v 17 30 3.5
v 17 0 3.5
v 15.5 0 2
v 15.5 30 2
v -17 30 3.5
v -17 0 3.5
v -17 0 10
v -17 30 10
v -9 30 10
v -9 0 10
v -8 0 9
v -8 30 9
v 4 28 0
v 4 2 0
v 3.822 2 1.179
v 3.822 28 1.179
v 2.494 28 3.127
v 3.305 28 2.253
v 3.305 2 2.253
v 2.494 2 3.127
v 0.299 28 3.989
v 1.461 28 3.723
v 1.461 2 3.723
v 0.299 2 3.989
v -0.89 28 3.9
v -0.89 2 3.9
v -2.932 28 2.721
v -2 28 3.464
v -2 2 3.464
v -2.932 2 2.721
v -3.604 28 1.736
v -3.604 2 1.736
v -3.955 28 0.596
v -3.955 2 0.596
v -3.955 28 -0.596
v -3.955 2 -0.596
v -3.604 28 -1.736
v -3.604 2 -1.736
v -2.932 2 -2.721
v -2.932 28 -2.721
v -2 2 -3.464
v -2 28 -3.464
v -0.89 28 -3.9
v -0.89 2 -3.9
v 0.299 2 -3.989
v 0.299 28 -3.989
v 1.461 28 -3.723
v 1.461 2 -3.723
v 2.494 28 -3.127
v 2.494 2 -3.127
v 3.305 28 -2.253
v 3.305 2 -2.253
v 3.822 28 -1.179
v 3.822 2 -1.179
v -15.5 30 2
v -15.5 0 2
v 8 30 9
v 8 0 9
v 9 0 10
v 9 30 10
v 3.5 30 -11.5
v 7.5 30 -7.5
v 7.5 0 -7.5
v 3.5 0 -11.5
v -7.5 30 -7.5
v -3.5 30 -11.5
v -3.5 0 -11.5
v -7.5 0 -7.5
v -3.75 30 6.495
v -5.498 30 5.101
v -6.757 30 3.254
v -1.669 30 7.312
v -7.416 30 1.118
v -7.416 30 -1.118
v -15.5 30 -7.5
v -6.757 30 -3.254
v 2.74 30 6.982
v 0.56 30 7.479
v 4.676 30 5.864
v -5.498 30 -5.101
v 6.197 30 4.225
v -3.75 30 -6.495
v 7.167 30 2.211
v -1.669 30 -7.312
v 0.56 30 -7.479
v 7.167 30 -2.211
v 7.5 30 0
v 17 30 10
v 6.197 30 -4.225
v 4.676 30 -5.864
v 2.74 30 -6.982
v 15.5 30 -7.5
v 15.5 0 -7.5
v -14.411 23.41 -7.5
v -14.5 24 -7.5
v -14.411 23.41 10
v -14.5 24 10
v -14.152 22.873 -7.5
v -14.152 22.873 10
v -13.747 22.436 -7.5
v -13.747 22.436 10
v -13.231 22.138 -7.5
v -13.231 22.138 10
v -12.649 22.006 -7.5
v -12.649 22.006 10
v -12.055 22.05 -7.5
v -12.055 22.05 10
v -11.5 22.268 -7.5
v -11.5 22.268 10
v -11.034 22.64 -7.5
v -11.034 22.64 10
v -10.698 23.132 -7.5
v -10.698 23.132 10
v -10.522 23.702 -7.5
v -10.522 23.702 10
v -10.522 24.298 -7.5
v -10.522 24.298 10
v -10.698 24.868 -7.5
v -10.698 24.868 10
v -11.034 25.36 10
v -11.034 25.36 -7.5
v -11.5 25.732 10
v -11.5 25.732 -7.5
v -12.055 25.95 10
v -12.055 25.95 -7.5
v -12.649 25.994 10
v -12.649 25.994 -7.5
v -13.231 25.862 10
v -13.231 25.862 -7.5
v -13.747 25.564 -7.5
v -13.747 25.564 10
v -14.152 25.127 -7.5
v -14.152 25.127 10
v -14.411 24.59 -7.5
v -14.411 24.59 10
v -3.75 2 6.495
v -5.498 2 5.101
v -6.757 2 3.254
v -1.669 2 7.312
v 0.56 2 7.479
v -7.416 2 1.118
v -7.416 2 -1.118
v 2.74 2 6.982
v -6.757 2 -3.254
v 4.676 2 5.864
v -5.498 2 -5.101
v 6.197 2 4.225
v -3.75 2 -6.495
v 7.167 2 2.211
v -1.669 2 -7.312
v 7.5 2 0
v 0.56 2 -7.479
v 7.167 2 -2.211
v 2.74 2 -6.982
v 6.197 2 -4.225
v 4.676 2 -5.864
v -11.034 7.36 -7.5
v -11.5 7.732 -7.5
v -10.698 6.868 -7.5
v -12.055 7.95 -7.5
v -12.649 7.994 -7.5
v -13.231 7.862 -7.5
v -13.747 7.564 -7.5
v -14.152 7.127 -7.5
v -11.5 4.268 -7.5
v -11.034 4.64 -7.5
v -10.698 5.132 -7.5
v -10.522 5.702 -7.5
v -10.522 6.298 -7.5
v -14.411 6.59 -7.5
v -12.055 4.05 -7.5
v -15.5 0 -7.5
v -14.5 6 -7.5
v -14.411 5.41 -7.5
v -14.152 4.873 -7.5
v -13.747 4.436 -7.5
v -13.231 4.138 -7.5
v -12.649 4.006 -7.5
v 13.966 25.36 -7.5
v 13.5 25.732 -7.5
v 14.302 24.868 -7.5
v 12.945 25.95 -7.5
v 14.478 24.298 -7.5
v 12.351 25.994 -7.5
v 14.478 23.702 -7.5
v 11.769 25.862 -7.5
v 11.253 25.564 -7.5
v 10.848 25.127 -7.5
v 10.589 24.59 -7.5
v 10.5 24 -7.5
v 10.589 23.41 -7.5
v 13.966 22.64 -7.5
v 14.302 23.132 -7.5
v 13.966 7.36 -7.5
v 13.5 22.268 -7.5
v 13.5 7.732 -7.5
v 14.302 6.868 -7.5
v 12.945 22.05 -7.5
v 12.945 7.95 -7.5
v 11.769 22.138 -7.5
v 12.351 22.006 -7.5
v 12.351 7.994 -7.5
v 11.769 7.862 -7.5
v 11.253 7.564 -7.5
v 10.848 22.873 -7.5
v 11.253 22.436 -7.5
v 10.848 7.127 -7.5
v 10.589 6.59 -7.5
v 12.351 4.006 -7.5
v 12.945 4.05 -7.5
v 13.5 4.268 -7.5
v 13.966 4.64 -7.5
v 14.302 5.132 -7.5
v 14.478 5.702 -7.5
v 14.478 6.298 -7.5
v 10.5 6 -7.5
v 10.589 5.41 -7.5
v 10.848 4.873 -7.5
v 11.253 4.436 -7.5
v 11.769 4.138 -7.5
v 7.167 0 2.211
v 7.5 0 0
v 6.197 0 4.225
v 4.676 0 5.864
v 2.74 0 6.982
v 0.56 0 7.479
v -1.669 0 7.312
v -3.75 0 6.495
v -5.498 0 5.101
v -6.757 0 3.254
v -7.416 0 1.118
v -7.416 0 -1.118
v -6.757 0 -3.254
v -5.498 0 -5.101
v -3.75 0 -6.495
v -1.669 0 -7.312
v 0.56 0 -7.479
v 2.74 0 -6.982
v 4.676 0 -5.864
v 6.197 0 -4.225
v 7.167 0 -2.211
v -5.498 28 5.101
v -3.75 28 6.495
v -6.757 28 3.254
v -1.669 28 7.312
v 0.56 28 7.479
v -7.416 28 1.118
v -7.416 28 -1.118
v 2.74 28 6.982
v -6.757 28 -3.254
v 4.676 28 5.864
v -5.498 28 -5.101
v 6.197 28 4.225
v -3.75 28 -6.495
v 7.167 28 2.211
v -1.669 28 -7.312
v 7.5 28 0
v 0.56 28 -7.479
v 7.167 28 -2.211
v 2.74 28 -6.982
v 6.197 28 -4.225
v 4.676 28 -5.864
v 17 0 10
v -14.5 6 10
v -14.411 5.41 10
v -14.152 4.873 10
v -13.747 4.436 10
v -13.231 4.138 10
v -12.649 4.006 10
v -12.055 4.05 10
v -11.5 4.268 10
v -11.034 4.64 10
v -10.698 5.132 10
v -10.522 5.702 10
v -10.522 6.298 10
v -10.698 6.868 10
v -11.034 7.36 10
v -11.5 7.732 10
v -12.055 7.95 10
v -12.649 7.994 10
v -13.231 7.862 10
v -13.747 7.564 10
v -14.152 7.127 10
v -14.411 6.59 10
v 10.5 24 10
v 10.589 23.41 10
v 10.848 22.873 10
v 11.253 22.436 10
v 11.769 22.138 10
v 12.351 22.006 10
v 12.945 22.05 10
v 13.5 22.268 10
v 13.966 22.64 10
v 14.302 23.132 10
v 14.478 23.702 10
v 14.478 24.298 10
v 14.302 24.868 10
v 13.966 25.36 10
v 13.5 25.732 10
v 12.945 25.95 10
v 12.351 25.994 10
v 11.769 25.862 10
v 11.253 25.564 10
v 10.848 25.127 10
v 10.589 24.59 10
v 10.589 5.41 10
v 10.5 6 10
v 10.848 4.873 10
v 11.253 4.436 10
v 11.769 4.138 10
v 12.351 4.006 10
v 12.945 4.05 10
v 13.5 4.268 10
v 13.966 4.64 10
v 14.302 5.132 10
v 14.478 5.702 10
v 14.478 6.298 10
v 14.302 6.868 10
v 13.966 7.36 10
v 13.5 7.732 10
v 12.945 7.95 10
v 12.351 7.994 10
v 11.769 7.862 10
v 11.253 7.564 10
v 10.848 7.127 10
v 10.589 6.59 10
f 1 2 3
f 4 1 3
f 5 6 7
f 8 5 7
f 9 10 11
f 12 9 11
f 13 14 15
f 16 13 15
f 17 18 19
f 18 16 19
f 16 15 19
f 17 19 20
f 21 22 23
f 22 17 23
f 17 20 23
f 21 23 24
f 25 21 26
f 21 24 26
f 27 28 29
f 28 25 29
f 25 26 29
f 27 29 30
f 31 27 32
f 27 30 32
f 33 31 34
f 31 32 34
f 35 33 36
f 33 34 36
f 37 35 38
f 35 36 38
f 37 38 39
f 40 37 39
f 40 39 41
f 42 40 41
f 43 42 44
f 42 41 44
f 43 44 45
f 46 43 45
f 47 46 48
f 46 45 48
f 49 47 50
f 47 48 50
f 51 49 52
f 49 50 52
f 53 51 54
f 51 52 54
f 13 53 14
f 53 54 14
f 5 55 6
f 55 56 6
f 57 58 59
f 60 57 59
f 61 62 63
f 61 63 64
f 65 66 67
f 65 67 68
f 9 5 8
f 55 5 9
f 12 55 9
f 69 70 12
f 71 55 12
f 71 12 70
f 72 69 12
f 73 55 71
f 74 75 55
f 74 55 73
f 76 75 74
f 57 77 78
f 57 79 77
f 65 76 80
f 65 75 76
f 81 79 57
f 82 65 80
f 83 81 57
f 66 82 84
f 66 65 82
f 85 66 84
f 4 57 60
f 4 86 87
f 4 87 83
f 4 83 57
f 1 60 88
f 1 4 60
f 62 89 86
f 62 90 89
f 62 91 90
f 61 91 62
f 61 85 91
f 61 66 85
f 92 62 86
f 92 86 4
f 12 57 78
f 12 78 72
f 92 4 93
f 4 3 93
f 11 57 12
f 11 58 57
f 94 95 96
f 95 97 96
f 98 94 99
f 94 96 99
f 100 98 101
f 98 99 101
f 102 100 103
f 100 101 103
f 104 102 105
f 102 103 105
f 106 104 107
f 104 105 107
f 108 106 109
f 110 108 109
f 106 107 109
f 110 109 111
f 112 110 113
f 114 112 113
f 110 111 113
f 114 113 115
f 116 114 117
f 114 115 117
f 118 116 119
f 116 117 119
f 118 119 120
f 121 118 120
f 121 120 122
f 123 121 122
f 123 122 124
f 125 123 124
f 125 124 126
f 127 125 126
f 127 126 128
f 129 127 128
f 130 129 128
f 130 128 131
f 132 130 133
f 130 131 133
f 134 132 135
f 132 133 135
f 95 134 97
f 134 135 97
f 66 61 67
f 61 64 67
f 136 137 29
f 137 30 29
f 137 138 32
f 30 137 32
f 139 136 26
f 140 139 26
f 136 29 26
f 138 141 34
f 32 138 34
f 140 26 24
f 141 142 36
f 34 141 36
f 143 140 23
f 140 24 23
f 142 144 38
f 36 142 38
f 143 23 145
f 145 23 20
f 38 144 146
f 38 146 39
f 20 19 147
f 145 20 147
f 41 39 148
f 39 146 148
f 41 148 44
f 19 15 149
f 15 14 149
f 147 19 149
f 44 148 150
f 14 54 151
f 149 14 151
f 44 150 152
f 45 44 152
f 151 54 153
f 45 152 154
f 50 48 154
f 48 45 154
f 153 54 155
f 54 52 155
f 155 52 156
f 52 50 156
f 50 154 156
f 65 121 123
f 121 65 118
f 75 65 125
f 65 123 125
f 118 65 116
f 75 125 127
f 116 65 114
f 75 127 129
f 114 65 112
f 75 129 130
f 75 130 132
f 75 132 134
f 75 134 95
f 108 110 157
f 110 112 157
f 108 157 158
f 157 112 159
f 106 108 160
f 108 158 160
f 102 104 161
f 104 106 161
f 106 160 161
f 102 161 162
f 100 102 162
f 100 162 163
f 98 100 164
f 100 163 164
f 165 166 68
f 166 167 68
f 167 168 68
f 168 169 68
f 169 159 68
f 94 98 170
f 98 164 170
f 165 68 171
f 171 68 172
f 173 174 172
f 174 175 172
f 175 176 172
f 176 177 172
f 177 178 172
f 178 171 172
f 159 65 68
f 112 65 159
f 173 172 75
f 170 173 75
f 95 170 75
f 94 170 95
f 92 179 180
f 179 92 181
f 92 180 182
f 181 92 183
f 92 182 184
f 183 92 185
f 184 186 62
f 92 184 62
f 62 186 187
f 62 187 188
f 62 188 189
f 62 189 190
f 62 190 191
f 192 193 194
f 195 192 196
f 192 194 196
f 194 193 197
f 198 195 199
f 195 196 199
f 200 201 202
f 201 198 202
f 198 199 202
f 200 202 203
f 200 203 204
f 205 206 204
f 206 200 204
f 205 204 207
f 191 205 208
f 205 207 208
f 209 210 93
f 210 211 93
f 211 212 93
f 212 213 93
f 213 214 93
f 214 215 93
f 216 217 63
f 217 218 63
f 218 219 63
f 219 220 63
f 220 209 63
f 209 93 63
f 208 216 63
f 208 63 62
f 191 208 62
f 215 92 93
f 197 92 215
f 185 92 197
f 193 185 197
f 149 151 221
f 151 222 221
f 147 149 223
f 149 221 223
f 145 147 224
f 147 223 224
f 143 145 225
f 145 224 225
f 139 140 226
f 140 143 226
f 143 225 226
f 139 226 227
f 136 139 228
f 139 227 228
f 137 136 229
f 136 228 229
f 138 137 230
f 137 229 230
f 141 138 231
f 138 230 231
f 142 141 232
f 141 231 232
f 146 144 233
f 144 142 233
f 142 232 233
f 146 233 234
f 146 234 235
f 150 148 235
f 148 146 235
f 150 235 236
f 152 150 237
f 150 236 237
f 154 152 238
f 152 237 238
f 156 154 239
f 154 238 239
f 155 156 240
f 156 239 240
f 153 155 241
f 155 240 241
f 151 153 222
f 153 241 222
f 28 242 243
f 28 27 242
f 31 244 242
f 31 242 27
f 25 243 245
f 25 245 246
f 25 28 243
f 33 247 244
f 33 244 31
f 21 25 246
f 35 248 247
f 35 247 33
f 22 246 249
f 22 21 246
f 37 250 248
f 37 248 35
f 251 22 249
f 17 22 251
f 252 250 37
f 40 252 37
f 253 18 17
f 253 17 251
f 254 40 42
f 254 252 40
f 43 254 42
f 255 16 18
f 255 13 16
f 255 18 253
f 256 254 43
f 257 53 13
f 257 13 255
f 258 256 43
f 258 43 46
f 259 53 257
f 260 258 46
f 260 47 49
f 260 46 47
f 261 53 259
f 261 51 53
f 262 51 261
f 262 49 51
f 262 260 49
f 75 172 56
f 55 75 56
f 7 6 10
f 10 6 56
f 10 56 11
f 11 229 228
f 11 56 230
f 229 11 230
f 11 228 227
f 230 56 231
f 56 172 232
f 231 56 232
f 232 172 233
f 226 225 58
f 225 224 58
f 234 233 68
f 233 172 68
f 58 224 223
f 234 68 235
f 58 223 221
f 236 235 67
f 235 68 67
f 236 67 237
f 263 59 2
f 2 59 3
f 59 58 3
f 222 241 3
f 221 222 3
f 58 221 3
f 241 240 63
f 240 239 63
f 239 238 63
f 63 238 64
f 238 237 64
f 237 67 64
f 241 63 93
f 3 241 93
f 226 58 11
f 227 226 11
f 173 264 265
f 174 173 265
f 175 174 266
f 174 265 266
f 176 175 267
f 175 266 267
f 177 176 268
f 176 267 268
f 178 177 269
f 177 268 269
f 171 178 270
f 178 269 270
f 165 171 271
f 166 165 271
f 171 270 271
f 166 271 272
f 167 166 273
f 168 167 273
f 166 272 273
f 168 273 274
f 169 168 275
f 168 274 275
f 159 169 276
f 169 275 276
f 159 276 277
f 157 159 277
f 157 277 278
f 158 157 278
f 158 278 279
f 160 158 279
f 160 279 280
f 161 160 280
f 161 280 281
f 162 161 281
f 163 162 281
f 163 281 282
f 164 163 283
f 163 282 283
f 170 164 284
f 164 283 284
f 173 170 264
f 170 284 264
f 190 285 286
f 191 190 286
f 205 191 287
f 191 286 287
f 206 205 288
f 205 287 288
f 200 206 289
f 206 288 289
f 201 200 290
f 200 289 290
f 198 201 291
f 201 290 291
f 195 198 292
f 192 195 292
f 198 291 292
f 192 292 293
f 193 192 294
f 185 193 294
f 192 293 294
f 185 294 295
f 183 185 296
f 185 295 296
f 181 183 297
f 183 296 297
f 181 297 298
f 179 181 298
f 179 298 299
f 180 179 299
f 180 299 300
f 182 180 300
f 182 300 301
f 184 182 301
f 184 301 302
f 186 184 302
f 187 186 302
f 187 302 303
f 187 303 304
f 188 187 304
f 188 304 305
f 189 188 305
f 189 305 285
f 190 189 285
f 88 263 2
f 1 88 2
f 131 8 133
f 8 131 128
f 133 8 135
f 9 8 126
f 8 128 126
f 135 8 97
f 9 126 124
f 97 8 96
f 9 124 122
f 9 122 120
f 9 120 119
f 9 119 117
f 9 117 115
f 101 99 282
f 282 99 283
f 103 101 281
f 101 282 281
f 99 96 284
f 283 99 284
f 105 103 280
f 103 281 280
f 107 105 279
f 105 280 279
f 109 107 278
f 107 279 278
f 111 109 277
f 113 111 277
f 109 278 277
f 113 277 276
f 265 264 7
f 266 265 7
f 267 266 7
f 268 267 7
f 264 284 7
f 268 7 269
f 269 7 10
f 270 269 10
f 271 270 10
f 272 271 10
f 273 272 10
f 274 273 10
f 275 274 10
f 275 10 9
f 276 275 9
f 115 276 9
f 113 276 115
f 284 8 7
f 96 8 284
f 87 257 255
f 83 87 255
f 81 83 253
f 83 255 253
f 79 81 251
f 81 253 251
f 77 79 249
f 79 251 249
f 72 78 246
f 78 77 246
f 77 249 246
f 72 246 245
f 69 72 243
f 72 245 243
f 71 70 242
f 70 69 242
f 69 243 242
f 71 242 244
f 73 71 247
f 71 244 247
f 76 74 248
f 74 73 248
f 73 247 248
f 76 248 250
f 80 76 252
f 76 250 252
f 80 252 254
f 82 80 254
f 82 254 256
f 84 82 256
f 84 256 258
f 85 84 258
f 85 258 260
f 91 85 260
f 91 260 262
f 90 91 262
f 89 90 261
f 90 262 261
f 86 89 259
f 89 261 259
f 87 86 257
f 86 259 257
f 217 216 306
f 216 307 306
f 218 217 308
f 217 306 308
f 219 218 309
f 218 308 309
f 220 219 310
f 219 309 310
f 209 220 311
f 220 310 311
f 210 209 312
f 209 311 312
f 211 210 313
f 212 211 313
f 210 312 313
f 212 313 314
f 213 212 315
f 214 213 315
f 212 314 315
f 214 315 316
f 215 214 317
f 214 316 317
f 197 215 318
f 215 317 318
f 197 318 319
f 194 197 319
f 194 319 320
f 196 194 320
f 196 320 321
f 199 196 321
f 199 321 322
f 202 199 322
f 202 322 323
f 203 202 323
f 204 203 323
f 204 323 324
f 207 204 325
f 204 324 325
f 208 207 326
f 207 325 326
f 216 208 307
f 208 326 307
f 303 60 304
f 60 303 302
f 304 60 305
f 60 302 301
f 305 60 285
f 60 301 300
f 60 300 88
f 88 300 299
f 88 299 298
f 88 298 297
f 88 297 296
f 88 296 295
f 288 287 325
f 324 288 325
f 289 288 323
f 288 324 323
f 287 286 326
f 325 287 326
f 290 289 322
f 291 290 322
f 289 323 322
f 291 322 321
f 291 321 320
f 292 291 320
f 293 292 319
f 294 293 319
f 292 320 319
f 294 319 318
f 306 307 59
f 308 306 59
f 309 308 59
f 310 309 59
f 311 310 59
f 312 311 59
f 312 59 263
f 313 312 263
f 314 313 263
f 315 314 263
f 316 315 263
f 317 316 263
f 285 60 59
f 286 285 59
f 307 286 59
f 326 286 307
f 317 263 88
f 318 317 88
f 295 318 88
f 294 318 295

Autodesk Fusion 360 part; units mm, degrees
sketch "Front" plane through (0, 0, 0) normal (0, 1, 0) x (1, 0, 0)
  circle A0 centre (0, 0) radius 4
  circle A1 centre (0, 0) radius 7.5
  line L0 (0, 0) -> (0, -15) construction
  line L1 (-18.6476, -9) -> (-14.6519, -9) construction
  line L2 (-14.6519, -9) -> (18.8366, -9) construction
  line L3 (-17, -10) -> (18.8681, -10) construction
  line L4 (-15, 7.5) -> (15, 7.5) construction
  line L5 (-15, 11.5) -> (15, 11.5) construction
  line L6 (0, -9) -> (8, -9)
  line L7 (8, -9) -> (9, -10)
  line L8 (9, -10) -> (17, -10)
  line L9 (17, -10) -> (17, -3.5)
  line L10 (17, -3.5) -> (15.5, -2)
  line L11 (15.5, -2) -> (15.5, 7.5)
  line L12 (7.5, 7.5) -> (3.5, 11.5)
  line L13 (-3.5, 11.5) -> (-7.5, 7.5)
  line L14 (-15.5, 7.5) -> (-15.5, -2)
  line L15 (-15.5, -2) -> (-17, -3.5)
  line L16 (-17, -3.5) -> (-17, -10)
  line L17 (-9, -10) -> (-8, -9)
  line L18 (0, -9) -> (-8, -9)
  line L19 (-17, -10) -> (-9, -10)
  line L20 (-7.5, 7.5) -> (-15.5, 7.5)
  line L21 (15.5, 7.5) -> (7.5, 7.5)
  line L22 (3.5, 11.5) -> (-3.5, 11.5)
  dimension "d1" = 8
  dimension "d2" = 15
  dimension "d5" = 9
  dimension "d6" = 10
  dimension "d7" = 7.5
  dimension "d8" = 11.5
  dimension "d9" = 15.5
  dimension "d10" = 15.5
  dimension "d11" = 1.5
  dimension "d12" = 1.5
  dimension "d13" = 1.5
  dimension "d14" = 1.5
  dimension "d15" = 16
  dimension "d16" = 4
  dimension "d17" = 4
  dimension "d18" = 6.5
  dimension "d19" = 9.5
  dimension "d20" = 8
  dimension "d21" = 8
  dimension "d22" = 1
extrude "Extrude1" add sketch "Front" along normal blind 30 contours L6 L7 L8 L9 L10 L11 L12 L13 L14 L15 L16 L17 L18 L19 L20 L21 L22
extrude "Extrude2" add sketch "Front" along normal blind 28 contours A1
extrude "Extrude3" cut sketch "Front" along normal blind 2 contours A1
sketch "Top" plane through (0, 0, 10) normal (0, 0, 1) x (-1, 0, 0)
  line L0 (17, 0) -> (9, 0)
  line L1 (9, 0) -> (9, -30)
  line L2 (9, -30) -> (17, -30)
  line L3 (17, -30) -> (17, 0)
  line L4 (17, -30) -> (-17, 0) construction
  line L5 (-17, -30) -> (17, 0) construction
  line L6 (-12.5, -24) -> (12.5, -24) construction
  line L7 (12.5, -24) -> (12.5, -6) construction
  line L8 (12.5, -6) -> (-12.5, -6) construction
  line L9 (-12.5, -6) -> (-12.5, -24) construction
  line L10 (-12.5, -24) -> (12.5, -6) construction
  line L11 (12.5, -24) -> (-12.5, -6) construction
  circle A0 centre (12.5, -24) radius 2
  circle A1 centre (-12.5, -24) radius 2
  circle A2 centre (-12.5, -6) radius 2
  circle A3 centre (12.5, -6) radius 2
  point P0 (0, -15)
  dimension "d29" = 25
  dimension "d30" = 18
  dimension "d31" = 4
  dimension "d32" = 4
  dimension "d33" = 4
  dimension "d34" = 4
extrude "Extrude4" cut sketch "Top" against normal blind 27 contours A0 | A1 | A2 | A3
